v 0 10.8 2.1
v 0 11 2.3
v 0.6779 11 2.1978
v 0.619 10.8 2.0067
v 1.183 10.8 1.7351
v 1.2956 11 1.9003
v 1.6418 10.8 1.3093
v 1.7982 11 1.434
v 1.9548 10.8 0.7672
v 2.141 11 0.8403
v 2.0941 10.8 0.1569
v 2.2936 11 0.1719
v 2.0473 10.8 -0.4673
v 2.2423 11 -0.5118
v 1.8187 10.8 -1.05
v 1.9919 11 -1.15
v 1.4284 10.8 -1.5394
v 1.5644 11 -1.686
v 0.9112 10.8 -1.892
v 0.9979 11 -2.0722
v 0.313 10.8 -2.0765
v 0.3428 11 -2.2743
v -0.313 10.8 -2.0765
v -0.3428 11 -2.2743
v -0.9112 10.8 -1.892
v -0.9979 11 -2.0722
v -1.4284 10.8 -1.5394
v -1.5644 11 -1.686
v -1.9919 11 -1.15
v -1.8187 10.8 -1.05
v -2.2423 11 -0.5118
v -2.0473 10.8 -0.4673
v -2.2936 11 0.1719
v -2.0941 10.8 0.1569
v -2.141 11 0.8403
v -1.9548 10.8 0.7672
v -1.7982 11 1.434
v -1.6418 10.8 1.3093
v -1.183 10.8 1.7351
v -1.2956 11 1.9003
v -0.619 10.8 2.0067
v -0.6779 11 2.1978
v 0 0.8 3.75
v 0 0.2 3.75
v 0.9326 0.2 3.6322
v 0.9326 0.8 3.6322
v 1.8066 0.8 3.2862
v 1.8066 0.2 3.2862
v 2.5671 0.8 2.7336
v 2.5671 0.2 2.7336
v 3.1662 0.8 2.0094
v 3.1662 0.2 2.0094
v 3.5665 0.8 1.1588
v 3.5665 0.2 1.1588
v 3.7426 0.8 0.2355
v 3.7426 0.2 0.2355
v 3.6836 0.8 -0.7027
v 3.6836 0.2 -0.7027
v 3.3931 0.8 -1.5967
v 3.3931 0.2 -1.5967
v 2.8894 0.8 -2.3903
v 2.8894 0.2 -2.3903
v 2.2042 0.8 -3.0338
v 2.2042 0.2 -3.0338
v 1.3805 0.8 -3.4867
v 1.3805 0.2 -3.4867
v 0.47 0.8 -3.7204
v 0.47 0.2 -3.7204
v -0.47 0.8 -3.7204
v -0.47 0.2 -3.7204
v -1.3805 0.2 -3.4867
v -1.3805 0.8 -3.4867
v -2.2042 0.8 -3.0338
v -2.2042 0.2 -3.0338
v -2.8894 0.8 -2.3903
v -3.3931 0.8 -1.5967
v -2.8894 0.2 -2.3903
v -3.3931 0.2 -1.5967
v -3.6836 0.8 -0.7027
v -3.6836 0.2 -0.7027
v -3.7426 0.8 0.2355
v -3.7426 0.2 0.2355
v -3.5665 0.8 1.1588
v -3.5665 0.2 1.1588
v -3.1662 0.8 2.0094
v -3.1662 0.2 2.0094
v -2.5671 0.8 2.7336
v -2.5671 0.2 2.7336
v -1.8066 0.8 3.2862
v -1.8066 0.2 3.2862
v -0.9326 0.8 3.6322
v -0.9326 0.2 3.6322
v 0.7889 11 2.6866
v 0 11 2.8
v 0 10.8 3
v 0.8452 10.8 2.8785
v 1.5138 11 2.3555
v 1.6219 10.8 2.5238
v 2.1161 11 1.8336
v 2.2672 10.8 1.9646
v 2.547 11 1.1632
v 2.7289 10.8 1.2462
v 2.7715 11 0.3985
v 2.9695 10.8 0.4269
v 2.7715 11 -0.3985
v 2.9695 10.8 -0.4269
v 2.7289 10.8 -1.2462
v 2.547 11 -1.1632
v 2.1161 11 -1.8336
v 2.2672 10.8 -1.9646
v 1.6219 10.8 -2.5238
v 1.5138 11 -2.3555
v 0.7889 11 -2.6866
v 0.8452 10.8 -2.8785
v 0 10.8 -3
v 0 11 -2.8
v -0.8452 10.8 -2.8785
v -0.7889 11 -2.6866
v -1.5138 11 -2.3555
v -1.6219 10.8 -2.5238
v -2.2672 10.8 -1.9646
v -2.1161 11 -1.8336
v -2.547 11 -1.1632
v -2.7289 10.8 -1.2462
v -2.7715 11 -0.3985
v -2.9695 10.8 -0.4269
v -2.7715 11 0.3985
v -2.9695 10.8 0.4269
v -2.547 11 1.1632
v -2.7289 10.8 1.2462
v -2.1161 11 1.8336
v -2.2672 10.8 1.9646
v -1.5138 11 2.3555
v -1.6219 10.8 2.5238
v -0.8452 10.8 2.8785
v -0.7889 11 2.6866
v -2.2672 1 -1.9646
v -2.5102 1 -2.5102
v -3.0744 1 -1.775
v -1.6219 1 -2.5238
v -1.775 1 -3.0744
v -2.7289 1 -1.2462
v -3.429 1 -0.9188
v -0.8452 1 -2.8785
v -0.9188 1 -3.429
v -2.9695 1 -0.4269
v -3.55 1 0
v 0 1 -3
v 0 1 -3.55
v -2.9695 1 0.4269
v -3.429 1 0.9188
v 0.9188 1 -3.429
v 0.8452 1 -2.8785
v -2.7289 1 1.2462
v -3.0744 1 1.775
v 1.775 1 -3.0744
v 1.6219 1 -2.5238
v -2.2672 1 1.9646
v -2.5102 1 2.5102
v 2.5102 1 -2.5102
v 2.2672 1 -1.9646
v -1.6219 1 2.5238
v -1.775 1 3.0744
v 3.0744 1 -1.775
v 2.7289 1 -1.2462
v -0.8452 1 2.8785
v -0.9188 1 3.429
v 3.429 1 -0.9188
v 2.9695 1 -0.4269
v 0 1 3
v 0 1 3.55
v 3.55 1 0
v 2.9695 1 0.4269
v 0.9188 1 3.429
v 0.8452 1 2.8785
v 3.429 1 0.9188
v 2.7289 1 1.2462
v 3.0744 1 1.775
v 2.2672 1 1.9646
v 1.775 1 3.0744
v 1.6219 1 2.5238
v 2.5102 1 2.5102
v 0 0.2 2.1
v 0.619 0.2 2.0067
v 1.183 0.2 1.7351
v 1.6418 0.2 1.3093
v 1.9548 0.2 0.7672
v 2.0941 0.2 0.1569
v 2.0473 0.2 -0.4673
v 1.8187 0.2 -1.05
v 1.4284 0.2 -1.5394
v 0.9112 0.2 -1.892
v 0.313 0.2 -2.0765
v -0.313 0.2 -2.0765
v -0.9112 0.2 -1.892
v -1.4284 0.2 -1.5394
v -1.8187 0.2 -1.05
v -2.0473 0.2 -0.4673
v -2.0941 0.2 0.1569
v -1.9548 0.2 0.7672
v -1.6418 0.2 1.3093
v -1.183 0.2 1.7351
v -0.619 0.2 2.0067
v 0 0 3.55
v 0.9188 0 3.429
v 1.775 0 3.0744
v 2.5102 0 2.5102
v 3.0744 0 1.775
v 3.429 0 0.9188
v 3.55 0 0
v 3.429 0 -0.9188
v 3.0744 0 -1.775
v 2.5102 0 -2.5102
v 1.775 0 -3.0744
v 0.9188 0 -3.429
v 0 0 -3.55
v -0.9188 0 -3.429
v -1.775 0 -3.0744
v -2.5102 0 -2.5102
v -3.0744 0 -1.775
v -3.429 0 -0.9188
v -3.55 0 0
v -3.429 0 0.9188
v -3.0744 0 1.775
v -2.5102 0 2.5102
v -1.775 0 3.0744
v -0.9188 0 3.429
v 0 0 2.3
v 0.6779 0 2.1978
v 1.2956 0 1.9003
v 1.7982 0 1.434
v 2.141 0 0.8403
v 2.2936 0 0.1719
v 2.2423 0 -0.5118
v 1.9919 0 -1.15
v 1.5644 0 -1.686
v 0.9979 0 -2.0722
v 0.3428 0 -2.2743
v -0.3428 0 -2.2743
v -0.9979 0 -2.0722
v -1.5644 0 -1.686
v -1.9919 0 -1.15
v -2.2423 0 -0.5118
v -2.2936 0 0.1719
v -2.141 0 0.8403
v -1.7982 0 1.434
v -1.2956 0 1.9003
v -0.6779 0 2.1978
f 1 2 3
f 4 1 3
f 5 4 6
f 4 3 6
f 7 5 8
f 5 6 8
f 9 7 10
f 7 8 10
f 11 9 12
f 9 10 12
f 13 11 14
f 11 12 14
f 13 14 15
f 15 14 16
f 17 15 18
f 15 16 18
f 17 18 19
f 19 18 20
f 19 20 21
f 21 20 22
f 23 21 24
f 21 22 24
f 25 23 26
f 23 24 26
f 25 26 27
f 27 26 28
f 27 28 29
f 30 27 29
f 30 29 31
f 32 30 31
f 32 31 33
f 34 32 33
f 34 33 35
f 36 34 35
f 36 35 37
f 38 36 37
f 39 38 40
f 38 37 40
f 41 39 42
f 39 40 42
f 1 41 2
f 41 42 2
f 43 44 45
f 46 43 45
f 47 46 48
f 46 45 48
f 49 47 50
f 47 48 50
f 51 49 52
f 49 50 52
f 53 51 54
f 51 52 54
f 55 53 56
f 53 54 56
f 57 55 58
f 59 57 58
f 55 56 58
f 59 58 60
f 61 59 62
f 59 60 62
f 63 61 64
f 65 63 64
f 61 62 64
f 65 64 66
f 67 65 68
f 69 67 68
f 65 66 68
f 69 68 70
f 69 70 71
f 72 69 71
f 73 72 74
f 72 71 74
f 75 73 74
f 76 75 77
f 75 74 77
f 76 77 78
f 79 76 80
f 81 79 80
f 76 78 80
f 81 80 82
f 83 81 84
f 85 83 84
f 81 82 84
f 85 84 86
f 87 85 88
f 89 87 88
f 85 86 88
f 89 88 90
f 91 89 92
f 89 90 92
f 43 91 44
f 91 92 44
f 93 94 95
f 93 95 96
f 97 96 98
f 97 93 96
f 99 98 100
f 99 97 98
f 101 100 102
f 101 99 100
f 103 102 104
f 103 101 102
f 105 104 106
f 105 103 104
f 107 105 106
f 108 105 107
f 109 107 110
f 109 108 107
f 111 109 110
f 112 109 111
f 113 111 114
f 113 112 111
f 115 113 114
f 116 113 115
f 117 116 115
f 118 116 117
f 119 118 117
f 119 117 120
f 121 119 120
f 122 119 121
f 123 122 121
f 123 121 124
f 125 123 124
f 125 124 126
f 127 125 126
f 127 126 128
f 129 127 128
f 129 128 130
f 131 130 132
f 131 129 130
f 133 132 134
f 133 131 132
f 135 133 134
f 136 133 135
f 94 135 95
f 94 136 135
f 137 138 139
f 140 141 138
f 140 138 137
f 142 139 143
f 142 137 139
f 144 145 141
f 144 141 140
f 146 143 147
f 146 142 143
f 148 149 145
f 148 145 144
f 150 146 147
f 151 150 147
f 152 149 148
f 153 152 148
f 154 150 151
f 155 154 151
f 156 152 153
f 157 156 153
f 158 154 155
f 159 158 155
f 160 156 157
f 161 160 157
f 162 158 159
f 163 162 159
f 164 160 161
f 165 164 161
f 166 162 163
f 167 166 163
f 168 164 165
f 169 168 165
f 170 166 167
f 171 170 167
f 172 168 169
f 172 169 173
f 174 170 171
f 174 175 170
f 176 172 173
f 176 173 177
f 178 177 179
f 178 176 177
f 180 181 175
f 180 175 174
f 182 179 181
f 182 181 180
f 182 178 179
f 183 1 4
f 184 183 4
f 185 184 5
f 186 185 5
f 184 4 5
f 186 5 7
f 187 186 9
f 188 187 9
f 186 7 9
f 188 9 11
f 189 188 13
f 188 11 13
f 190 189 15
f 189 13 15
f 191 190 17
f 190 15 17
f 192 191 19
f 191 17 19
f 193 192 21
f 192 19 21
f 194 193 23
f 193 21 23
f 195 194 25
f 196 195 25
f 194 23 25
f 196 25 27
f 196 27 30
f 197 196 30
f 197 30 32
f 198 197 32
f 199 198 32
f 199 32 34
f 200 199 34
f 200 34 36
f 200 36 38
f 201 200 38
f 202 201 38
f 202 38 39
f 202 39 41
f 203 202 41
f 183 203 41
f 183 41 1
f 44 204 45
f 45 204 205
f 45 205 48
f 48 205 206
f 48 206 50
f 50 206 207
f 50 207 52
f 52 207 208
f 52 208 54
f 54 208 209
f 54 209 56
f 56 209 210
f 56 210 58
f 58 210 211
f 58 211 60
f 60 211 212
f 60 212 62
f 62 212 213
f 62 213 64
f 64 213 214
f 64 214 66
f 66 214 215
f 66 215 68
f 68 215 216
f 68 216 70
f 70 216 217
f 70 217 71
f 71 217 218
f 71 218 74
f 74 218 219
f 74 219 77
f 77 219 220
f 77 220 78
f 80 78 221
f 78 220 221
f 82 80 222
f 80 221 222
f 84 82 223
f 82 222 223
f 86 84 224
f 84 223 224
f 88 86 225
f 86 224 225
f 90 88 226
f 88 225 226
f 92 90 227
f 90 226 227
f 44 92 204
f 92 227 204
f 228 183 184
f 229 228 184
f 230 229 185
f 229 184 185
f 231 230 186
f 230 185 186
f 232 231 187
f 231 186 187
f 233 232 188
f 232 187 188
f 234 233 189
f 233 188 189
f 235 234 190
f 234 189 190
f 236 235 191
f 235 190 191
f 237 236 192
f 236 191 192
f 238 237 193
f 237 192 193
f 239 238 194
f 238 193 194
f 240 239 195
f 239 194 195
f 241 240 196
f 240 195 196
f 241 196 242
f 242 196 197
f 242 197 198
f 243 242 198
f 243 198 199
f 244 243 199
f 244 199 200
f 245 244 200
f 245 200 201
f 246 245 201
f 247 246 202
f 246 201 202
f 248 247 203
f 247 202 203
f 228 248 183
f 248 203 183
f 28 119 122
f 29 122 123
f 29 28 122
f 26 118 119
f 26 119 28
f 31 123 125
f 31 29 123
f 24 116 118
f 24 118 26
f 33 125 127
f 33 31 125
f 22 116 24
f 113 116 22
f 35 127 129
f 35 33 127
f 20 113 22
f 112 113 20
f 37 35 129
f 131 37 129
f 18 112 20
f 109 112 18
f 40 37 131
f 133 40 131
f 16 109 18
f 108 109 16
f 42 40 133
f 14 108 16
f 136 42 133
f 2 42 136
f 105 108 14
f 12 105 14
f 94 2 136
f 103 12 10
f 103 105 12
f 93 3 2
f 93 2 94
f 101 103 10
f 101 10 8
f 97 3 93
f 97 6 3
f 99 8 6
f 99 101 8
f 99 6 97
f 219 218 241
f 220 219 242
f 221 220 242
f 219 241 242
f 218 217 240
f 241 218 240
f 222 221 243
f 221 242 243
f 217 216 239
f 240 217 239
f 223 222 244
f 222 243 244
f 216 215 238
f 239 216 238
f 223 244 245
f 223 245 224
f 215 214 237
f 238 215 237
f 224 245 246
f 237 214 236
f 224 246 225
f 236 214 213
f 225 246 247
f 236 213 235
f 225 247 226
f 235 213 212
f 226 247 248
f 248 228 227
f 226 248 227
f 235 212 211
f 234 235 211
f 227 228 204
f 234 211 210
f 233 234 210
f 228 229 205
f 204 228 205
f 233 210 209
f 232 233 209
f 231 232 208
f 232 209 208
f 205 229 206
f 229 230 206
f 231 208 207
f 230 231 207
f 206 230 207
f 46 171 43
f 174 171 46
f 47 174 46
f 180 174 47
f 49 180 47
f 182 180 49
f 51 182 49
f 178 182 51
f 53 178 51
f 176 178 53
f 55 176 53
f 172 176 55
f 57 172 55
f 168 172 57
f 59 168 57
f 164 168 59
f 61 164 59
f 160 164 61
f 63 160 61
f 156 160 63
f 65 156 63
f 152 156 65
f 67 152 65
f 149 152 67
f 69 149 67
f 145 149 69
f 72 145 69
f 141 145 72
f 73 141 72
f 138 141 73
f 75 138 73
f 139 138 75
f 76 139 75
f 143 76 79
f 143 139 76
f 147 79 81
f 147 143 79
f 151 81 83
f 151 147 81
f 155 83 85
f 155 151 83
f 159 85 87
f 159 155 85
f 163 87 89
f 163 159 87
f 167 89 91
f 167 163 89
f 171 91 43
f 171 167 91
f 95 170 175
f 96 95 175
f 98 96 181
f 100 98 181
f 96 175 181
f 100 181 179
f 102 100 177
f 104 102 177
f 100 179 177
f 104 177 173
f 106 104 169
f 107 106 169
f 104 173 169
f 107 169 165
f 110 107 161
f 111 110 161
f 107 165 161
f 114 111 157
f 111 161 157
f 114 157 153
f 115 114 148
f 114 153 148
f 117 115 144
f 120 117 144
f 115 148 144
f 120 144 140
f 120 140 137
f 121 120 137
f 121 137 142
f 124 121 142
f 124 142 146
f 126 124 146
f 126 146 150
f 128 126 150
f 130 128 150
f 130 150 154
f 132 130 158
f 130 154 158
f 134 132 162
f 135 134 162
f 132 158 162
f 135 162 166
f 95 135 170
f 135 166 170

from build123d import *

# Parameters (mm, degrees)
SKETCH_1_R          = 3.75
EXTRUDE_1_DEPTH     = 1
SKETCH_2_R          = 3
EXTRUDE_2_DEPTH     = 10
SKETCH_3_R          = 2.1
CUT_EXTRUDE_1_DEPTH = 13.211674742
CHAMFER_1_SIZE      = 0.2
CHAMFER_2_SIZE      = 0.2


with BuildPart() as part:
    # 草图1 → 凸台-拉伸1 (new body)
    with BuildSketch(Plane(origin=(0, 0, 0), x_dir=(1, 0, 0), z_dir=(0, 1, 0))):
        with Locations(Location((0, 0, 0), (0, 0, 270))):
            Circle(SKETCH_1_R)
    extrude(amount=EXTRUDE_1_DEPTH)

    # 草图2 → 凸台-拉伸2 (add)
    with BuildSketch(Plane(origin=(0, 1, 0), x_dir=(1, 0, 0), z_dir=(0, 1, 0))):
        with Locations(Location((0, 0, 0), (0, 0, 270))):
            Circle(SKETCH_2_R)
    extrude(amount=EXTRUDE_2_DEPTH)

    # 草图3 → 切除-拉伸1 (cut, through all)
    with BuildSketch(Plane(origin=(0, 11, 0), x_dir=(1, 0, 0), z_dir=(0, 1, 0))):
        with Locations(Location((0, 0, 0), (0, 0, 270))):
            Circle(SKETCH_3_R)
    extrude(amount=-CUT_EXTRUDE_1_DEPTH, mode=Mode.SUBTRACT)

    # 倒角1
    chamfer_1_edges = [part.edges().sort_by_distance(p)[0] for p in [
        (0, 1, -3.75),
        (0, 11, -3),
    ]]
    chamfer(chamfer_1_edges, length=CHAMFER_1_SIZE)

    # 倒角2
    chamfer_2_edges = [part.edges().sort_by_distance(p)[0] for p in [
        (0, 0, -2.1),
        (0, 11, -2.1),
        (0, 0, -3.75),
    ]]
    chamfer(chamfer_2_edges, length=CHAMFER_2_SIZE)


solid = part.part
